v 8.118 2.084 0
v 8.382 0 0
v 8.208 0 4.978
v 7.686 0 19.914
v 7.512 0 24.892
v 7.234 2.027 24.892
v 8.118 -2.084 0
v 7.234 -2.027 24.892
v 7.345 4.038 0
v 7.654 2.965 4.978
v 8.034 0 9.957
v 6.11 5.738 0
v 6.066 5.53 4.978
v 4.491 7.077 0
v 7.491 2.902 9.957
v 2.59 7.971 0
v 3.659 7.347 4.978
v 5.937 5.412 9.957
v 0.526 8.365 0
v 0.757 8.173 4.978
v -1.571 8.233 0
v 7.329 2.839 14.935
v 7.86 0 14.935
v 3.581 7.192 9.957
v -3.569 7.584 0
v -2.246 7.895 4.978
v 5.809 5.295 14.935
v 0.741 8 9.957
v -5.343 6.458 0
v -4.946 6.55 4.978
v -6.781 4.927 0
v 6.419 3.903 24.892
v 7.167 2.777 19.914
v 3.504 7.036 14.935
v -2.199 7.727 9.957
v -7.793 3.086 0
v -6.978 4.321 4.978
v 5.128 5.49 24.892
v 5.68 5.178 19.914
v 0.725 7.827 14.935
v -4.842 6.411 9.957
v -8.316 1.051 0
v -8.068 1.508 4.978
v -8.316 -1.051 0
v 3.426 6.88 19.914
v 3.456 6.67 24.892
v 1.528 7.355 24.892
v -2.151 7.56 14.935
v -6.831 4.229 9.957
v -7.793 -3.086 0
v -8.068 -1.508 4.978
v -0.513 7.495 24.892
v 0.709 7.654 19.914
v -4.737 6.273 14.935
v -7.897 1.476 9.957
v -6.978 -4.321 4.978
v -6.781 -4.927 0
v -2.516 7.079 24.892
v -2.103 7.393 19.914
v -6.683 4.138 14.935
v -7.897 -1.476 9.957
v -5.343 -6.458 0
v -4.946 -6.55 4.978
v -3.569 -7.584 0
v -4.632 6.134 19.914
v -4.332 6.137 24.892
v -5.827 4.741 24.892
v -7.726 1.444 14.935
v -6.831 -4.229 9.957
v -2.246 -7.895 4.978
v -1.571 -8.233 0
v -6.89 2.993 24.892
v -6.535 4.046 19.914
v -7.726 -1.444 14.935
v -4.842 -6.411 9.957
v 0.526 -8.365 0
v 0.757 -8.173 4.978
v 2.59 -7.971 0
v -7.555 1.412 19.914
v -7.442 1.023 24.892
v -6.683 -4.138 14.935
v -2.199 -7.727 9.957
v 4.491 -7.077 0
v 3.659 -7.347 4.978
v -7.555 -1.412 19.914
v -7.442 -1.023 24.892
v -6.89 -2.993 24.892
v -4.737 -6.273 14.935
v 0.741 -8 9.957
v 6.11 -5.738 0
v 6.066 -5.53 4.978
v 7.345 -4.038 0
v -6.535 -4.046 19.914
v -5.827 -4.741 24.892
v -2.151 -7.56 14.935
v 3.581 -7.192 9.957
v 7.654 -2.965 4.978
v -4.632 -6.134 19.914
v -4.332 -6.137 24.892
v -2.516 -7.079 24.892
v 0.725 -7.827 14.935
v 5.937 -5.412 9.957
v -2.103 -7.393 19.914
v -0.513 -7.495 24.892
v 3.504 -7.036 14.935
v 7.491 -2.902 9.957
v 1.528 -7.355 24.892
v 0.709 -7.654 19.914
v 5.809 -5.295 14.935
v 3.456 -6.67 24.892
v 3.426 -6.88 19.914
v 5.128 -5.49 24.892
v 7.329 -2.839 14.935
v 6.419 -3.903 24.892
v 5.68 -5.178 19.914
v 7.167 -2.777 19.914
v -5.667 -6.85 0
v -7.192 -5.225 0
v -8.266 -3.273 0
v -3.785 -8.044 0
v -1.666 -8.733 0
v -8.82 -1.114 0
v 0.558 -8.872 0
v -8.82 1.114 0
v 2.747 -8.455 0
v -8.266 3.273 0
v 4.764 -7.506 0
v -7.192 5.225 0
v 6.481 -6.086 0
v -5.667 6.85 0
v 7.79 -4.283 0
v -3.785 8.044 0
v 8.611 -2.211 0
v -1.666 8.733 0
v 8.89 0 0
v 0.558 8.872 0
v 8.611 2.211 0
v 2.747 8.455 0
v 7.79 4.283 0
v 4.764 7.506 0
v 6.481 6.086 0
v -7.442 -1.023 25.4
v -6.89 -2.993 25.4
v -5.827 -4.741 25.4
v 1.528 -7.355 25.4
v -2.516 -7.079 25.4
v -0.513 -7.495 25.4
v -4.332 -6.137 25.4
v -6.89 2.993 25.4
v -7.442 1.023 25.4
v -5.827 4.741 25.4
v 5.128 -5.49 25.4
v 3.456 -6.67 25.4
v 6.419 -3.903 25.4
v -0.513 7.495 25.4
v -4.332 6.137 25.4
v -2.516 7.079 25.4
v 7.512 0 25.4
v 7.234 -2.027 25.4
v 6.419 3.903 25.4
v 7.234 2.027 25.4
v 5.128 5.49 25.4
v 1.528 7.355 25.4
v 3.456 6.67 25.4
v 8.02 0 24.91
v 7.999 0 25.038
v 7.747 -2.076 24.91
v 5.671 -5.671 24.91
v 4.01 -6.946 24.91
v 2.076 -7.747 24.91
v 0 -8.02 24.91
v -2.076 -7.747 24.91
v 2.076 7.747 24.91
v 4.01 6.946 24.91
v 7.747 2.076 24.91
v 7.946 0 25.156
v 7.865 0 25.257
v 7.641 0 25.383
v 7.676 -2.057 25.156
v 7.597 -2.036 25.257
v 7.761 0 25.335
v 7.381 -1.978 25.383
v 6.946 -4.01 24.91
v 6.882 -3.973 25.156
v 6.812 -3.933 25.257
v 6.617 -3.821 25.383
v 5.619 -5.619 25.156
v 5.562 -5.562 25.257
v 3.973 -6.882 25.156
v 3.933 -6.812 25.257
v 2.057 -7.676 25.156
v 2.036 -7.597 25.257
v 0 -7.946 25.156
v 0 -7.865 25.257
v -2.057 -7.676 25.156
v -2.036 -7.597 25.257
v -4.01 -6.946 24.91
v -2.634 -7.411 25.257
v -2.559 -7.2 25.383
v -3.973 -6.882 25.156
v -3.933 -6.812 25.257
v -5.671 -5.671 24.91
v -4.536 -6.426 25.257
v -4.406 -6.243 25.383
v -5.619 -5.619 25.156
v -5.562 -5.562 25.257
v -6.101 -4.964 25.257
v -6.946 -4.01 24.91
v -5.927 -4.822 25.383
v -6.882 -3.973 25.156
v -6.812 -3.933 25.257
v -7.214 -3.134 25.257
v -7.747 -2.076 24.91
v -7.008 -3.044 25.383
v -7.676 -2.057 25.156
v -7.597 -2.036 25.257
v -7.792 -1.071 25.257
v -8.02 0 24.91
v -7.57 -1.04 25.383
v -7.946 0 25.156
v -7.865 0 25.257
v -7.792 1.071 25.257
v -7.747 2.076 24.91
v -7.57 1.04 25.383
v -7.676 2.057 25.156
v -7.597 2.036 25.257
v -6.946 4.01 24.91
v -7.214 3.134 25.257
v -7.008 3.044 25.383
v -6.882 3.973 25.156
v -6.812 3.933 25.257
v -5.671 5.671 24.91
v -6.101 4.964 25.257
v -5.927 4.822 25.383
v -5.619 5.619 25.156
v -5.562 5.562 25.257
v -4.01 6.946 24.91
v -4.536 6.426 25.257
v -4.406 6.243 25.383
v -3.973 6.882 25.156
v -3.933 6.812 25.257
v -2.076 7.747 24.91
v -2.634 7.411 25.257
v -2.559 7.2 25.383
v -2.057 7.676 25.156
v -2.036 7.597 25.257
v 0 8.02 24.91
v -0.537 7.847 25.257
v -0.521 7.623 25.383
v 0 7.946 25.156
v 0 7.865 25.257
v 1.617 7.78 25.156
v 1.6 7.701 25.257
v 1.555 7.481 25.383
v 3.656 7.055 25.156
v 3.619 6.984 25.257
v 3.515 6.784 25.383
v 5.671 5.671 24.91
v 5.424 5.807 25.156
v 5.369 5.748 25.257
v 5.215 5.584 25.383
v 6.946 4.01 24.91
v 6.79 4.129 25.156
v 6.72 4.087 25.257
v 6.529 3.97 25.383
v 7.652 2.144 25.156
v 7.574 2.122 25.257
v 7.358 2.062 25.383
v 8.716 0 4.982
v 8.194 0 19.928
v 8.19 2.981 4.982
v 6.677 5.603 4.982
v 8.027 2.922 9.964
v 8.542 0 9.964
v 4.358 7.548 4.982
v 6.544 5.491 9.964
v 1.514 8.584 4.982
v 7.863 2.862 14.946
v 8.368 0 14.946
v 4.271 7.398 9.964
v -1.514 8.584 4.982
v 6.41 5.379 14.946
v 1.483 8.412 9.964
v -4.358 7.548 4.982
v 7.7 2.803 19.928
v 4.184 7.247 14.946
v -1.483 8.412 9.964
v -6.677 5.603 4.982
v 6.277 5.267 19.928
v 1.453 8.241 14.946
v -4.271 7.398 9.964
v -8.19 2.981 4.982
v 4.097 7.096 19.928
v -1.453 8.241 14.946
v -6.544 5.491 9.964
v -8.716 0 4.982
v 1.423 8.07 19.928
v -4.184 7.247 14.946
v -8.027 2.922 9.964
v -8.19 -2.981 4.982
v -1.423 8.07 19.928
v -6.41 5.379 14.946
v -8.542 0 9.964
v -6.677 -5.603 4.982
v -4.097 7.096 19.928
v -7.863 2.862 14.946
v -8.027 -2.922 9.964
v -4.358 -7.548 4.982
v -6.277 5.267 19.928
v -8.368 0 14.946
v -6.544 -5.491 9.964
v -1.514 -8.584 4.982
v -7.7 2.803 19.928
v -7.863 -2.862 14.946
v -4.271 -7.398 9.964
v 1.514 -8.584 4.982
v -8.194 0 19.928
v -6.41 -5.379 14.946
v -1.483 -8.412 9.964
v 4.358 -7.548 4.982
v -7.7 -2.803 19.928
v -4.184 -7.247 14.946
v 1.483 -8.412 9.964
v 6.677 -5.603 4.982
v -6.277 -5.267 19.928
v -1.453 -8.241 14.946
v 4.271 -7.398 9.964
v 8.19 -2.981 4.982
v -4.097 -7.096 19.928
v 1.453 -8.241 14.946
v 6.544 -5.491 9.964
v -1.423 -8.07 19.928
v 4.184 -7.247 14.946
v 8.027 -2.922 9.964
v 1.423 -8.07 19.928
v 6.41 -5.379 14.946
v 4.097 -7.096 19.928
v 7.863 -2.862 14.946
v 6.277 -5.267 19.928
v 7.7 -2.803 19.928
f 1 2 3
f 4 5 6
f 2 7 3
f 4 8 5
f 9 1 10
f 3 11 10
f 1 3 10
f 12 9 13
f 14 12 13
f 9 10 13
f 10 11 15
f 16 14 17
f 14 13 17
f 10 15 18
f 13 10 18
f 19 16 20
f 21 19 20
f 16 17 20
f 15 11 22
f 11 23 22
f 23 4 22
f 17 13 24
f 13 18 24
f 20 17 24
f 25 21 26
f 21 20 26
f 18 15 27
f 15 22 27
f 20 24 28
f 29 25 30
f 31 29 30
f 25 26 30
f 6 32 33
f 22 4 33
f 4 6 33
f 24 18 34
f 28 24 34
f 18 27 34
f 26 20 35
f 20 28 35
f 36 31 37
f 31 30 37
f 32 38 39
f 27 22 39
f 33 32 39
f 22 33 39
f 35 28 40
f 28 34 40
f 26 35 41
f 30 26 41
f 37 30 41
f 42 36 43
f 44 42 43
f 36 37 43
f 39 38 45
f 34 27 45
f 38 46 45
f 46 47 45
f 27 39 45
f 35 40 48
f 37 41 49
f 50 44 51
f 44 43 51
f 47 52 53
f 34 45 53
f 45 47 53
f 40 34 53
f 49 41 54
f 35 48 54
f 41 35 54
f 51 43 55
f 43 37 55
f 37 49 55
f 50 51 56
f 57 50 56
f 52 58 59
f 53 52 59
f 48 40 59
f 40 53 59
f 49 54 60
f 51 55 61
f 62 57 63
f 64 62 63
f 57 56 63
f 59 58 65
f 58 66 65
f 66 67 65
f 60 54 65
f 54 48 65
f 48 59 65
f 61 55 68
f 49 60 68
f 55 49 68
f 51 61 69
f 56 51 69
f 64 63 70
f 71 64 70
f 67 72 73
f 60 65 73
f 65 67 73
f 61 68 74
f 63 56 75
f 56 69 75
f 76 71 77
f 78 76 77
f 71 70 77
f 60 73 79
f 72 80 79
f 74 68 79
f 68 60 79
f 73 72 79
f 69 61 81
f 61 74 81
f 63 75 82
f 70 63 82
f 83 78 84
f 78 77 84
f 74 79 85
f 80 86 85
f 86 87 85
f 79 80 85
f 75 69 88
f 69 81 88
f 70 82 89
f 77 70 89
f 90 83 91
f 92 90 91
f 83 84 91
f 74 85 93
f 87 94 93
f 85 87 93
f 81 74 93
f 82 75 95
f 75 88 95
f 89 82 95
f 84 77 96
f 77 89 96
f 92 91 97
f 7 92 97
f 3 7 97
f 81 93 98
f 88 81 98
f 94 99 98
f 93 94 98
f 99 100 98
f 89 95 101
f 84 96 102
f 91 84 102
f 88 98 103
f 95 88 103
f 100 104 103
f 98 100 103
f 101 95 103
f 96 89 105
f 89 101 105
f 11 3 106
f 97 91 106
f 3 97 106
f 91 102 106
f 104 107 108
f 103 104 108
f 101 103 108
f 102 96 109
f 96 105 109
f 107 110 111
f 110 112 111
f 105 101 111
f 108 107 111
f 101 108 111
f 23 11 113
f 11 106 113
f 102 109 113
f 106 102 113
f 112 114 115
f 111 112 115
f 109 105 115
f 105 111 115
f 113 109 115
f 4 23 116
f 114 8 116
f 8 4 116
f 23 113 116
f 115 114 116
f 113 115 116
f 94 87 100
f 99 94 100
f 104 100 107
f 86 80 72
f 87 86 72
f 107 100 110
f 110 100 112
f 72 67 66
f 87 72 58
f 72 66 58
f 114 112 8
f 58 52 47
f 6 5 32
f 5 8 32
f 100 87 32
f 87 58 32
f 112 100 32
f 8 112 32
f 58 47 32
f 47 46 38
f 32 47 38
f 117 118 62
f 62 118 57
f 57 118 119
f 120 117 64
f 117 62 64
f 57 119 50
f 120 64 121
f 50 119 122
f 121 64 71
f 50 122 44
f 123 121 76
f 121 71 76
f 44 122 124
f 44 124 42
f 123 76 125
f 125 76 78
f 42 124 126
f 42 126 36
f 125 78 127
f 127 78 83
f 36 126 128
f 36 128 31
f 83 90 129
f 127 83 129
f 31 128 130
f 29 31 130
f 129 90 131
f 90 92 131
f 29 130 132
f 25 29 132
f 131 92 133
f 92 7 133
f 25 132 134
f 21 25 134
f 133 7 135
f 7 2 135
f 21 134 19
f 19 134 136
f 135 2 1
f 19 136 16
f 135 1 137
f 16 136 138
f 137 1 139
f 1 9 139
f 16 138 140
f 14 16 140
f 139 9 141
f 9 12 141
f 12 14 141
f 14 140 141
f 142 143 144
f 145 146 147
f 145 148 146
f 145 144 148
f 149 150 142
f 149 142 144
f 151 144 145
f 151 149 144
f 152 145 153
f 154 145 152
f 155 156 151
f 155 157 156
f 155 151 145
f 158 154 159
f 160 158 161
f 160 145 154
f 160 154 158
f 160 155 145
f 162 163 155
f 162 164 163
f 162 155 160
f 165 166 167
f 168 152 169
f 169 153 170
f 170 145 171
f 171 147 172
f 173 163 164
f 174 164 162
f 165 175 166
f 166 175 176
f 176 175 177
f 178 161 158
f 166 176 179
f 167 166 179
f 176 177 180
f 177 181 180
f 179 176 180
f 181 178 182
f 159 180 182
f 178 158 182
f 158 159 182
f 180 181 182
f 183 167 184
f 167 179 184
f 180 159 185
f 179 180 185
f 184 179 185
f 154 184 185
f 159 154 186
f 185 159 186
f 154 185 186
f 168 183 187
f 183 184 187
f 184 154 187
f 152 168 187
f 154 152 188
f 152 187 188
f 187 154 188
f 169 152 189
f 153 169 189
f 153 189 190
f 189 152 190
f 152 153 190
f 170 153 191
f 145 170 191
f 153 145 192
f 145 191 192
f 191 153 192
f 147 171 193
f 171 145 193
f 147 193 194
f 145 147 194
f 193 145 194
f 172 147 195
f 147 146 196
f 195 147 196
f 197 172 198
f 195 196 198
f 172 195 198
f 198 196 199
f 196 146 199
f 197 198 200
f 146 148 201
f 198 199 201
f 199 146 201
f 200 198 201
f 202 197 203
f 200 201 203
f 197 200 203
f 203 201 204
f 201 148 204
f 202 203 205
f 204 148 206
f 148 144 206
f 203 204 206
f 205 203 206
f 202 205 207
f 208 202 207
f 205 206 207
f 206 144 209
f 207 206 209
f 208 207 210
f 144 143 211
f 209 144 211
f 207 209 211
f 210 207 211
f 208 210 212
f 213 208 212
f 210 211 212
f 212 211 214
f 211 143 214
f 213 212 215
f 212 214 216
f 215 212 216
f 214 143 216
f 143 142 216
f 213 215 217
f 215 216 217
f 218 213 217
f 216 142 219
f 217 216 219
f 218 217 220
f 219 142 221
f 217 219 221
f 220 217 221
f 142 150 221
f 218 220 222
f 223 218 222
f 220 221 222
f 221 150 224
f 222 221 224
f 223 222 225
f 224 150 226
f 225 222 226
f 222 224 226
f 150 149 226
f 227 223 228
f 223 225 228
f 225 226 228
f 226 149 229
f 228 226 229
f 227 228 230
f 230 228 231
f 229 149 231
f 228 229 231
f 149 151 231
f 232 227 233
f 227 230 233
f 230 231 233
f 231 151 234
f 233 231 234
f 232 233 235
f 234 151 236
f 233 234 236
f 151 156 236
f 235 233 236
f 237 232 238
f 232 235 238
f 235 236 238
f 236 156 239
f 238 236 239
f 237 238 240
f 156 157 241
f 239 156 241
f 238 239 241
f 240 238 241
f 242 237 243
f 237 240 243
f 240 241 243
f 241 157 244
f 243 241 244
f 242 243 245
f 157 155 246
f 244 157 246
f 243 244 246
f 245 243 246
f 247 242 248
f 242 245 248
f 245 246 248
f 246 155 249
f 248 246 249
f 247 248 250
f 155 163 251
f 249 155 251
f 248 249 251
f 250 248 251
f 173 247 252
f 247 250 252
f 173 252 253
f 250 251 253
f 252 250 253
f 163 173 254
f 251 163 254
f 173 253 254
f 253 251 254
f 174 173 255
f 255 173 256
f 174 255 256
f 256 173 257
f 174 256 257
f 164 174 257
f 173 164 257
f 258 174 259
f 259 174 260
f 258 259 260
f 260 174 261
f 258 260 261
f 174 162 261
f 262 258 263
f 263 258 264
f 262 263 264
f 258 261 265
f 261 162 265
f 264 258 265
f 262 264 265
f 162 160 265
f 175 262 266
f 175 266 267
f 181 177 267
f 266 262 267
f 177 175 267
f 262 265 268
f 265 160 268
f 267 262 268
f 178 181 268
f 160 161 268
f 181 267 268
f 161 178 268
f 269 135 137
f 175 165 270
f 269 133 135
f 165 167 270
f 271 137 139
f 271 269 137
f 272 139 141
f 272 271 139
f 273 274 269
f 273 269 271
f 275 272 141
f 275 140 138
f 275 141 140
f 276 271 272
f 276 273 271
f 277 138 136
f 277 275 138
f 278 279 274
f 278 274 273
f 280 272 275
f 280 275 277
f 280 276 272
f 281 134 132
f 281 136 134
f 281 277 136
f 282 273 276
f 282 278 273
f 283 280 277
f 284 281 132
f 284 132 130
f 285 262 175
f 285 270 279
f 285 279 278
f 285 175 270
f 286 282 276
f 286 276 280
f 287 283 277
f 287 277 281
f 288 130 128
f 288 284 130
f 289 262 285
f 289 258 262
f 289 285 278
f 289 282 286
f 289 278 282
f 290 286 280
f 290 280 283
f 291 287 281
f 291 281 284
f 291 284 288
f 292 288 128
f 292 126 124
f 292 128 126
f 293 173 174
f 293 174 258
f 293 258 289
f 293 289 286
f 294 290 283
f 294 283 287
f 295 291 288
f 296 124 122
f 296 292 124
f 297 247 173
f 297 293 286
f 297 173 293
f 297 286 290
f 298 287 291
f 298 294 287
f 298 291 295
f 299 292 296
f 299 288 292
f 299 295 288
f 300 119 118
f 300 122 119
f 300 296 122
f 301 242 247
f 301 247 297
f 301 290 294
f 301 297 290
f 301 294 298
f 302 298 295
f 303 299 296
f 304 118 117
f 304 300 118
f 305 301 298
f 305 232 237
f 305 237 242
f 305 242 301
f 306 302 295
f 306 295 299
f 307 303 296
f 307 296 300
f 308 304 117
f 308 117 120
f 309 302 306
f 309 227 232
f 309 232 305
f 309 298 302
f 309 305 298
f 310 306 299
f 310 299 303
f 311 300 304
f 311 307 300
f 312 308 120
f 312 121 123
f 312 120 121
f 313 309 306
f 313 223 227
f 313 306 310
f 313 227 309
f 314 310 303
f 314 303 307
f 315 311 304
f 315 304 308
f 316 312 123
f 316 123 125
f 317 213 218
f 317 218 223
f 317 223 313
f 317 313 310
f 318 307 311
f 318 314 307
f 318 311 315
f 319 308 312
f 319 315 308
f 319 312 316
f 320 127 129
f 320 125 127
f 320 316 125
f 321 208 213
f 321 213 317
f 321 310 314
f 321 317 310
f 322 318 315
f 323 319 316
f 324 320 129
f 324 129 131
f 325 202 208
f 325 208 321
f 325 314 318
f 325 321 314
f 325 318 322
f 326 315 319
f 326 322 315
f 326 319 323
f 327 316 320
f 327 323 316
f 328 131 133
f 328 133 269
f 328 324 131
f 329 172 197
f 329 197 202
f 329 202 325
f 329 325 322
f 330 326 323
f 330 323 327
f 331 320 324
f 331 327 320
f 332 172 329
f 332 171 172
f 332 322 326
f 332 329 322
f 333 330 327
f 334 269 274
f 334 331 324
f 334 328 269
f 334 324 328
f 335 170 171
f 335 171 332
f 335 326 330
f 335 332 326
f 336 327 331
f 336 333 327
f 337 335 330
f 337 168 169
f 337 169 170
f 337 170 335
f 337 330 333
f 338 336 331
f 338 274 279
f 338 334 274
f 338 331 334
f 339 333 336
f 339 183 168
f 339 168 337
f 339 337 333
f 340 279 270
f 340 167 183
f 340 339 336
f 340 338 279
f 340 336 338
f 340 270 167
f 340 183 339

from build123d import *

# Parameters (mm, degrees)
F0_R     = 8.89
F1_DEPTH = 25.4
F1_TAPER = 2
F2_T     = -0.508
F3_R     = 0.508


with BuildPart() as f1:
    # F0 (on Top) → F1 (new body)
    with BuildSketch(Plane.XY):
        Circle(F0_R)
    extrude(amount=F1_DEPTH, taper=F1_TAPER)

    # F2
    f2_openings = [f1.faces().sort_by_distance(p)[0] for p in [
        (0, 0, 0),
    ]]
    offset(amount=F2_T, openings=f2_openings)

    # F3
    f3_edges = [f1.edges().sort_by_distance(p)[0] for p in [
        (-8.003012, 0, 25.4),
    ]]
    fillet(f3_edges, radius=F3_R)


solid = f1.part
